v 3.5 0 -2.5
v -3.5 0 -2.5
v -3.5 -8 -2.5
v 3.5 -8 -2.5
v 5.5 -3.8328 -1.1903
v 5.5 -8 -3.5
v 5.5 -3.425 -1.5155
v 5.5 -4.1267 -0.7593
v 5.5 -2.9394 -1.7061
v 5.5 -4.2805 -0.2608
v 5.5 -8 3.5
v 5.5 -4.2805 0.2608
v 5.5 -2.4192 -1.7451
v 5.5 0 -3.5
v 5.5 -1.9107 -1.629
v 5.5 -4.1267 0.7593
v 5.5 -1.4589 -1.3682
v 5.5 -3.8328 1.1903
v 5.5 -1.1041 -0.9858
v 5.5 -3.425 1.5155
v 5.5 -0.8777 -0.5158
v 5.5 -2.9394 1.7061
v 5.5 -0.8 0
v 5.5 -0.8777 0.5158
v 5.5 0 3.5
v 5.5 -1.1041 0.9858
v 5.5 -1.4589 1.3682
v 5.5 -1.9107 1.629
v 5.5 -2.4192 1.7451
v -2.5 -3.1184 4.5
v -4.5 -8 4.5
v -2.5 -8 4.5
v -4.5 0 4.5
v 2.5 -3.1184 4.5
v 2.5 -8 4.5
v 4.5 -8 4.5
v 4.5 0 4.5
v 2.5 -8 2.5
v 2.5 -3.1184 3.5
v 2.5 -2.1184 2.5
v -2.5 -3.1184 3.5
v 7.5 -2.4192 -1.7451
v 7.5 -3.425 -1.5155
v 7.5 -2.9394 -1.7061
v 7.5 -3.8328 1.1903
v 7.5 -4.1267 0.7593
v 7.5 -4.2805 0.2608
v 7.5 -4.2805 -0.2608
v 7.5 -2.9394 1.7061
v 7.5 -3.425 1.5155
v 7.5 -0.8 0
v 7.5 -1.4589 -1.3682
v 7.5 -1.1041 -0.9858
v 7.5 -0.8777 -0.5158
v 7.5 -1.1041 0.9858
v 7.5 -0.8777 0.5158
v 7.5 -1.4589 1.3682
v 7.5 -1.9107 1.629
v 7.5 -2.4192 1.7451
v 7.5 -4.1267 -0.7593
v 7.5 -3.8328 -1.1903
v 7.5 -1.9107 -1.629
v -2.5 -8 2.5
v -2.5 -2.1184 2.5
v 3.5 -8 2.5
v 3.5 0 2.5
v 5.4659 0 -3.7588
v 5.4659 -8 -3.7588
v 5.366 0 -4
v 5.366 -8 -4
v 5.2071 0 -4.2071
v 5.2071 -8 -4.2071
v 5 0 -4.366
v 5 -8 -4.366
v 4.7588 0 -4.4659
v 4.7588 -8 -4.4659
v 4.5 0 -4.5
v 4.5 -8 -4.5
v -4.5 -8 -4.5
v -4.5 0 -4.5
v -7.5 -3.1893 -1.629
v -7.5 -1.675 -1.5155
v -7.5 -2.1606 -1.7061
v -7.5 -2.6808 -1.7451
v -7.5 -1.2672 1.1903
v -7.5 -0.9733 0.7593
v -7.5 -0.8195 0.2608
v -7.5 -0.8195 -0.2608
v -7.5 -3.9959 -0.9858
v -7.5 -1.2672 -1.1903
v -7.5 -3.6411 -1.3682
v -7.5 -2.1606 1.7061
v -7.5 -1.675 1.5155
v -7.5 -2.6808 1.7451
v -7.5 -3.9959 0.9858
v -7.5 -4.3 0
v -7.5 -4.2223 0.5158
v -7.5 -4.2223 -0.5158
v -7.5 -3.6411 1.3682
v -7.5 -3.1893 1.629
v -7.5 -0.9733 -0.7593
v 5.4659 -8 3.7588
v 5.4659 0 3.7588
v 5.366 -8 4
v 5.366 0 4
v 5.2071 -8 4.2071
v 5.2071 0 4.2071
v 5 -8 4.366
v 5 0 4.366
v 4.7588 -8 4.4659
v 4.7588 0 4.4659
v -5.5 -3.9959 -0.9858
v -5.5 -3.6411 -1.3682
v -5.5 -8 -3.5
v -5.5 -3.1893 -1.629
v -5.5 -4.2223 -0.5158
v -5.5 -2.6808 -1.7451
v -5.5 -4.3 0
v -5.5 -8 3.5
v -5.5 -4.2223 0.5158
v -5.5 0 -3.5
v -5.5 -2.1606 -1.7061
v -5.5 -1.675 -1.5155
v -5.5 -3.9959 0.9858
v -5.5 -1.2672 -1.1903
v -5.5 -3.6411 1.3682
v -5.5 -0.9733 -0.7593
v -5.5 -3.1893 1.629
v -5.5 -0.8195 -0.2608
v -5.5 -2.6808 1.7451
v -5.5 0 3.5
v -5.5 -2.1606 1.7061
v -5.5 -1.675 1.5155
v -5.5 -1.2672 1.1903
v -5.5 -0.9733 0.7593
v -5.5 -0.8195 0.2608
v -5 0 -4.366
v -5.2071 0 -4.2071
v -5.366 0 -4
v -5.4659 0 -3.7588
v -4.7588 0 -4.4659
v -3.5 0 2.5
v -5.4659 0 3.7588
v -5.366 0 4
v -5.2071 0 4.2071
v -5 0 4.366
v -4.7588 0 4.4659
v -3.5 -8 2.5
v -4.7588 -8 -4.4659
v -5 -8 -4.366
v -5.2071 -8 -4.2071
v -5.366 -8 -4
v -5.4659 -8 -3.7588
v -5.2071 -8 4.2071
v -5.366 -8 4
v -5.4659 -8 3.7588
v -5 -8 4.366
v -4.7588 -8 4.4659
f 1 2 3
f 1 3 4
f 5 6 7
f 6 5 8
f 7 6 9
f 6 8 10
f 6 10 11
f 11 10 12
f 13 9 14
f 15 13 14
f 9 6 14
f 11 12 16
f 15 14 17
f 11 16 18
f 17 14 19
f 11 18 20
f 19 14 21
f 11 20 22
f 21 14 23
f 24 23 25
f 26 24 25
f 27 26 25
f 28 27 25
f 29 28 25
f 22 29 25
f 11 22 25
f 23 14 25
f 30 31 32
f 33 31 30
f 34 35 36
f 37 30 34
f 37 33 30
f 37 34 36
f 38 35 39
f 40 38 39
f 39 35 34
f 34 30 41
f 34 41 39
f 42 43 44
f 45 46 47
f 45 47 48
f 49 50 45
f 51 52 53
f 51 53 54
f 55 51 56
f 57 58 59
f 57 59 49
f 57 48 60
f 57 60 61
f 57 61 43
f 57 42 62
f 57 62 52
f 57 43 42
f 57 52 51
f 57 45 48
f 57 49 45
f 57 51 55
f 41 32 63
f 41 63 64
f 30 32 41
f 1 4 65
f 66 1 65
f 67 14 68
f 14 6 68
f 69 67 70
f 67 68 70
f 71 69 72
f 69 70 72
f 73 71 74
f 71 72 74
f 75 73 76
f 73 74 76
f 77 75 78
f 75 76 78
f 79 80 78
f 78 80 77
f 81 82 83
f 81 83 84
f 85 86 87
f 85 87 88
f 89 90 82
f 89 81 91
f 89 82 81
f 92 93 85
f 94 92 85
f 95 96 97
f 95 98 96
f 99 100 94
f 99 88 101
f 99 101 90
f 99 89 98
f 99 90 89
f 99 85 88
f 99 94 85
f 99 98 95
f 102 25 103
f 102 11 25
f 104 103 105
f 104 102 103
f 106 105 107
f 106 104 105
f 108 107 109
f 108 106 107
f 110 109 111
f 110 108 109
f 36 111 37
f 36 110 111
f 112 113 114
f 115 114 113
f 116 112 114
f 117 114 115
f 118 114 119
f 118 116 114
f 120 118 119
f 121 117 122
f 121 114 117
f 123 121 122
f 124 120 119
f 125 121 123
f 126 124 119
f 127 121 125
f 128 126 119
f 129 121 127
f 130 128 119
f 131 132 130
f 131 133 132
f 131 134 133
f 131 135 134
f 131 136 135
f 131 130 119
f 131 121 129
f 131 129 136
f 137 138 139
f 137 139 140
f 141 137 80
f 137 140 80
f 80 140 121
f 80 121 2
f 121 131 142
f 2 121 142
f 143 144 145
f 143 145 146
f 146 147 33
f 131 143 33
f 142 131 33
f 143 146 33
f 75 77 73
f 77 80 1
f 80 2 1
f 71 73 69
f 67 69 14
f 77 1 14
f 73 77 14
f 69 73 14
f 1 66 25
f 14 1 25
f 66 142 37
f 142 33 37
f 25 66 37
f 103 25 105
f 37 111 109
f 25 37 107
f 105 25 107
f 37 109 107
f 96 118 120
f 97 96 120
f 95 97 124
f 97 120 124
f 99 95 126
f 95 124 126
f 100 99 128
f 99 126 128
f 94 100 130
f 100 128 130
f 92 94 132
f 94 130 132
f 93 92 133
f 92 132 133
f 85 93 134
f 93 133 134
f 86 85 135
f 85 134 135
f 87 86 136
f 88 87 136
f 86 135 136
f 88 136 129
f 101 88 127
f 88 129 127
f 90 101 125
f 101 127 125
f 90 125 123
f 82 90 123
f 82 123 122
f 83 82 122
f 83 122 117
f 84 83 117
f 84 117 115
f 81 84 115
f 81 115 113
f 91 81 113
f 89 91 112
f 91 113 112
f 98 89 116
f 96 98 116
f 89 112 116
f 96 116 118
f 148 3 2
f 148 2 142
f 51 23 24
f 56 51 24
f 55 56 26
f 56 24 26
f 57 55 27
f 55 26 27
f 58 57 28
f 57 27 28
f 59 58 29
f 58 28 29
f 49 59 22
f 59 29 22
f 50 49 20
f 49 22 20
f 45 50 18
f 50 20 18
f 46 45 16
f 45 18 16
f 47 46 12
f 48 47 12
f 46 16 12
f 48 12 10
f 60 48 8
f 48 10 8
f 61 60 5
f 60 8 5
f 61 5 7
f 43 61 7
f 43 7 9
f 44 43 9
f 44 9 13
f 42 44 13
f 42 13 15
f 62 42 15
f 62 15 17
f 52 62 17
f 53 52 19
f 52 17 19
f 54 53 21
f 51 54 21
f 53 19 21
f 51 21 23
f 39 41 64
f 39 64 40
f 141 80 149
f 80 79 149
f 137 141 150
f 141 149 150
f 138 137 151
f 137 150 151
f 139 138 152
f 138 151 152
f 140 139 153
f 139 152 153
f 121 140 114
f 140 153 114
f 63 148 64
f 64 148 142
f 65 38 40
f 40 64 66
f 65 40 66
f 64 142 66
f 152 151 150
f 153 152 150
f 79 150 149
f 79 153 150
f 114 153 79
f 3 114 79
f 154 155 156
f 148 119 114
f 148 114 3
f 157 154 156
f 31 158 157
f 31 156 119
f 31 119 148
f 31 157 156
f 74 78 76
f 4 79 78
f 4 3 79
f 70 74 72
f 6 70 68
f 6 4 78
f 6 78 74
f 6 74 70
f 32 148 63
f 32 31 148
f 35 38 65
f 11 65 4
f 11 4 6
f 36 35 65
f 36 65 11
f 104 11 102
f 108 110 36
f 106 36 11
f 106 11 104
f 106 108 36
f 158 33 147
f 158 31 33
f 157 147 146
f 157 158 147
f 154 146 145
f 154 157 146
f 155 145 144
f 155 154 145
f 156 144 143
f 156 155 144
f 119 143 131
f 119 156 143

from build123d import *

# Parameters (mm, degrees)
F0_W     = 11
F0_H     = 9
F0_W_2   = 7
F0_H_2   = 5
F1_DEPTH = 8
F2_W     = 5
F2_H     = 4.881562
F3_DEPTH = 5
F4_R     = 1.75
F5_DEPTH = 2
F6_R     = 1.75
F7_DEPTH = 2
F8_SIZE  = 1
F9_R     = 1


with BuildPart() as f1:
    # F0 (on Front) → F1 (new body)
    with BuildSketch(Plane.XZ):
        Rectangle(F0_W, F0_H)
        Rectangle(F0_W_2, F0_H_2, mode=Mode.SUBTRACT)
    extrude(amount=F1_DEPTH)

    # F2 (on face) → F3 (cut)
    with BuildSketch(Plane.XY.offset(4.5)):
        with Locations((0, -5.559219)):
            Rectangle(F2_W, F2_H)
    extrude(amount=-F3_DEPTH, mode=Mode.SUBTRACT)

    # F4 (on face) → F5 (join)
    with BuildSketch(Plane(origin=(-5.5, 0, 0), x_dir=(0, -1, 0), z_dir=(-1, 0, 0))):
        with Locations((2.55, 0)):
            Circle(F4_R)
    extrude(amount=F5_DEPTH)

    # F6 (on face) → F7 (join)
    with BuildSketch(Plane.YZ.offset(5.5)):
        with Locations((-2.55, 0)):
            Circle(F6_R)
    extrude(amount=F7_DEPTH)

    # F8
    f8_edges = [f1.edges().sort_by_distance(p)[0] for p in [
        (0, -3.118438, 2.5),
    ]]
    chamfer(f8_edges, length=F8_SIZE)

    # F9
    f9_edges = [f1.edges().sort_by_distance(p)[0] for p in [
        (5.5, -4, 4.5),
        (-5.5, -4, 4.5),
        (5.5, -4, -4.5),
        (-5.5, -4, -4.5),
    ]]
    fillet(f9_edges, radius=F9_R)


solid = f1.part
